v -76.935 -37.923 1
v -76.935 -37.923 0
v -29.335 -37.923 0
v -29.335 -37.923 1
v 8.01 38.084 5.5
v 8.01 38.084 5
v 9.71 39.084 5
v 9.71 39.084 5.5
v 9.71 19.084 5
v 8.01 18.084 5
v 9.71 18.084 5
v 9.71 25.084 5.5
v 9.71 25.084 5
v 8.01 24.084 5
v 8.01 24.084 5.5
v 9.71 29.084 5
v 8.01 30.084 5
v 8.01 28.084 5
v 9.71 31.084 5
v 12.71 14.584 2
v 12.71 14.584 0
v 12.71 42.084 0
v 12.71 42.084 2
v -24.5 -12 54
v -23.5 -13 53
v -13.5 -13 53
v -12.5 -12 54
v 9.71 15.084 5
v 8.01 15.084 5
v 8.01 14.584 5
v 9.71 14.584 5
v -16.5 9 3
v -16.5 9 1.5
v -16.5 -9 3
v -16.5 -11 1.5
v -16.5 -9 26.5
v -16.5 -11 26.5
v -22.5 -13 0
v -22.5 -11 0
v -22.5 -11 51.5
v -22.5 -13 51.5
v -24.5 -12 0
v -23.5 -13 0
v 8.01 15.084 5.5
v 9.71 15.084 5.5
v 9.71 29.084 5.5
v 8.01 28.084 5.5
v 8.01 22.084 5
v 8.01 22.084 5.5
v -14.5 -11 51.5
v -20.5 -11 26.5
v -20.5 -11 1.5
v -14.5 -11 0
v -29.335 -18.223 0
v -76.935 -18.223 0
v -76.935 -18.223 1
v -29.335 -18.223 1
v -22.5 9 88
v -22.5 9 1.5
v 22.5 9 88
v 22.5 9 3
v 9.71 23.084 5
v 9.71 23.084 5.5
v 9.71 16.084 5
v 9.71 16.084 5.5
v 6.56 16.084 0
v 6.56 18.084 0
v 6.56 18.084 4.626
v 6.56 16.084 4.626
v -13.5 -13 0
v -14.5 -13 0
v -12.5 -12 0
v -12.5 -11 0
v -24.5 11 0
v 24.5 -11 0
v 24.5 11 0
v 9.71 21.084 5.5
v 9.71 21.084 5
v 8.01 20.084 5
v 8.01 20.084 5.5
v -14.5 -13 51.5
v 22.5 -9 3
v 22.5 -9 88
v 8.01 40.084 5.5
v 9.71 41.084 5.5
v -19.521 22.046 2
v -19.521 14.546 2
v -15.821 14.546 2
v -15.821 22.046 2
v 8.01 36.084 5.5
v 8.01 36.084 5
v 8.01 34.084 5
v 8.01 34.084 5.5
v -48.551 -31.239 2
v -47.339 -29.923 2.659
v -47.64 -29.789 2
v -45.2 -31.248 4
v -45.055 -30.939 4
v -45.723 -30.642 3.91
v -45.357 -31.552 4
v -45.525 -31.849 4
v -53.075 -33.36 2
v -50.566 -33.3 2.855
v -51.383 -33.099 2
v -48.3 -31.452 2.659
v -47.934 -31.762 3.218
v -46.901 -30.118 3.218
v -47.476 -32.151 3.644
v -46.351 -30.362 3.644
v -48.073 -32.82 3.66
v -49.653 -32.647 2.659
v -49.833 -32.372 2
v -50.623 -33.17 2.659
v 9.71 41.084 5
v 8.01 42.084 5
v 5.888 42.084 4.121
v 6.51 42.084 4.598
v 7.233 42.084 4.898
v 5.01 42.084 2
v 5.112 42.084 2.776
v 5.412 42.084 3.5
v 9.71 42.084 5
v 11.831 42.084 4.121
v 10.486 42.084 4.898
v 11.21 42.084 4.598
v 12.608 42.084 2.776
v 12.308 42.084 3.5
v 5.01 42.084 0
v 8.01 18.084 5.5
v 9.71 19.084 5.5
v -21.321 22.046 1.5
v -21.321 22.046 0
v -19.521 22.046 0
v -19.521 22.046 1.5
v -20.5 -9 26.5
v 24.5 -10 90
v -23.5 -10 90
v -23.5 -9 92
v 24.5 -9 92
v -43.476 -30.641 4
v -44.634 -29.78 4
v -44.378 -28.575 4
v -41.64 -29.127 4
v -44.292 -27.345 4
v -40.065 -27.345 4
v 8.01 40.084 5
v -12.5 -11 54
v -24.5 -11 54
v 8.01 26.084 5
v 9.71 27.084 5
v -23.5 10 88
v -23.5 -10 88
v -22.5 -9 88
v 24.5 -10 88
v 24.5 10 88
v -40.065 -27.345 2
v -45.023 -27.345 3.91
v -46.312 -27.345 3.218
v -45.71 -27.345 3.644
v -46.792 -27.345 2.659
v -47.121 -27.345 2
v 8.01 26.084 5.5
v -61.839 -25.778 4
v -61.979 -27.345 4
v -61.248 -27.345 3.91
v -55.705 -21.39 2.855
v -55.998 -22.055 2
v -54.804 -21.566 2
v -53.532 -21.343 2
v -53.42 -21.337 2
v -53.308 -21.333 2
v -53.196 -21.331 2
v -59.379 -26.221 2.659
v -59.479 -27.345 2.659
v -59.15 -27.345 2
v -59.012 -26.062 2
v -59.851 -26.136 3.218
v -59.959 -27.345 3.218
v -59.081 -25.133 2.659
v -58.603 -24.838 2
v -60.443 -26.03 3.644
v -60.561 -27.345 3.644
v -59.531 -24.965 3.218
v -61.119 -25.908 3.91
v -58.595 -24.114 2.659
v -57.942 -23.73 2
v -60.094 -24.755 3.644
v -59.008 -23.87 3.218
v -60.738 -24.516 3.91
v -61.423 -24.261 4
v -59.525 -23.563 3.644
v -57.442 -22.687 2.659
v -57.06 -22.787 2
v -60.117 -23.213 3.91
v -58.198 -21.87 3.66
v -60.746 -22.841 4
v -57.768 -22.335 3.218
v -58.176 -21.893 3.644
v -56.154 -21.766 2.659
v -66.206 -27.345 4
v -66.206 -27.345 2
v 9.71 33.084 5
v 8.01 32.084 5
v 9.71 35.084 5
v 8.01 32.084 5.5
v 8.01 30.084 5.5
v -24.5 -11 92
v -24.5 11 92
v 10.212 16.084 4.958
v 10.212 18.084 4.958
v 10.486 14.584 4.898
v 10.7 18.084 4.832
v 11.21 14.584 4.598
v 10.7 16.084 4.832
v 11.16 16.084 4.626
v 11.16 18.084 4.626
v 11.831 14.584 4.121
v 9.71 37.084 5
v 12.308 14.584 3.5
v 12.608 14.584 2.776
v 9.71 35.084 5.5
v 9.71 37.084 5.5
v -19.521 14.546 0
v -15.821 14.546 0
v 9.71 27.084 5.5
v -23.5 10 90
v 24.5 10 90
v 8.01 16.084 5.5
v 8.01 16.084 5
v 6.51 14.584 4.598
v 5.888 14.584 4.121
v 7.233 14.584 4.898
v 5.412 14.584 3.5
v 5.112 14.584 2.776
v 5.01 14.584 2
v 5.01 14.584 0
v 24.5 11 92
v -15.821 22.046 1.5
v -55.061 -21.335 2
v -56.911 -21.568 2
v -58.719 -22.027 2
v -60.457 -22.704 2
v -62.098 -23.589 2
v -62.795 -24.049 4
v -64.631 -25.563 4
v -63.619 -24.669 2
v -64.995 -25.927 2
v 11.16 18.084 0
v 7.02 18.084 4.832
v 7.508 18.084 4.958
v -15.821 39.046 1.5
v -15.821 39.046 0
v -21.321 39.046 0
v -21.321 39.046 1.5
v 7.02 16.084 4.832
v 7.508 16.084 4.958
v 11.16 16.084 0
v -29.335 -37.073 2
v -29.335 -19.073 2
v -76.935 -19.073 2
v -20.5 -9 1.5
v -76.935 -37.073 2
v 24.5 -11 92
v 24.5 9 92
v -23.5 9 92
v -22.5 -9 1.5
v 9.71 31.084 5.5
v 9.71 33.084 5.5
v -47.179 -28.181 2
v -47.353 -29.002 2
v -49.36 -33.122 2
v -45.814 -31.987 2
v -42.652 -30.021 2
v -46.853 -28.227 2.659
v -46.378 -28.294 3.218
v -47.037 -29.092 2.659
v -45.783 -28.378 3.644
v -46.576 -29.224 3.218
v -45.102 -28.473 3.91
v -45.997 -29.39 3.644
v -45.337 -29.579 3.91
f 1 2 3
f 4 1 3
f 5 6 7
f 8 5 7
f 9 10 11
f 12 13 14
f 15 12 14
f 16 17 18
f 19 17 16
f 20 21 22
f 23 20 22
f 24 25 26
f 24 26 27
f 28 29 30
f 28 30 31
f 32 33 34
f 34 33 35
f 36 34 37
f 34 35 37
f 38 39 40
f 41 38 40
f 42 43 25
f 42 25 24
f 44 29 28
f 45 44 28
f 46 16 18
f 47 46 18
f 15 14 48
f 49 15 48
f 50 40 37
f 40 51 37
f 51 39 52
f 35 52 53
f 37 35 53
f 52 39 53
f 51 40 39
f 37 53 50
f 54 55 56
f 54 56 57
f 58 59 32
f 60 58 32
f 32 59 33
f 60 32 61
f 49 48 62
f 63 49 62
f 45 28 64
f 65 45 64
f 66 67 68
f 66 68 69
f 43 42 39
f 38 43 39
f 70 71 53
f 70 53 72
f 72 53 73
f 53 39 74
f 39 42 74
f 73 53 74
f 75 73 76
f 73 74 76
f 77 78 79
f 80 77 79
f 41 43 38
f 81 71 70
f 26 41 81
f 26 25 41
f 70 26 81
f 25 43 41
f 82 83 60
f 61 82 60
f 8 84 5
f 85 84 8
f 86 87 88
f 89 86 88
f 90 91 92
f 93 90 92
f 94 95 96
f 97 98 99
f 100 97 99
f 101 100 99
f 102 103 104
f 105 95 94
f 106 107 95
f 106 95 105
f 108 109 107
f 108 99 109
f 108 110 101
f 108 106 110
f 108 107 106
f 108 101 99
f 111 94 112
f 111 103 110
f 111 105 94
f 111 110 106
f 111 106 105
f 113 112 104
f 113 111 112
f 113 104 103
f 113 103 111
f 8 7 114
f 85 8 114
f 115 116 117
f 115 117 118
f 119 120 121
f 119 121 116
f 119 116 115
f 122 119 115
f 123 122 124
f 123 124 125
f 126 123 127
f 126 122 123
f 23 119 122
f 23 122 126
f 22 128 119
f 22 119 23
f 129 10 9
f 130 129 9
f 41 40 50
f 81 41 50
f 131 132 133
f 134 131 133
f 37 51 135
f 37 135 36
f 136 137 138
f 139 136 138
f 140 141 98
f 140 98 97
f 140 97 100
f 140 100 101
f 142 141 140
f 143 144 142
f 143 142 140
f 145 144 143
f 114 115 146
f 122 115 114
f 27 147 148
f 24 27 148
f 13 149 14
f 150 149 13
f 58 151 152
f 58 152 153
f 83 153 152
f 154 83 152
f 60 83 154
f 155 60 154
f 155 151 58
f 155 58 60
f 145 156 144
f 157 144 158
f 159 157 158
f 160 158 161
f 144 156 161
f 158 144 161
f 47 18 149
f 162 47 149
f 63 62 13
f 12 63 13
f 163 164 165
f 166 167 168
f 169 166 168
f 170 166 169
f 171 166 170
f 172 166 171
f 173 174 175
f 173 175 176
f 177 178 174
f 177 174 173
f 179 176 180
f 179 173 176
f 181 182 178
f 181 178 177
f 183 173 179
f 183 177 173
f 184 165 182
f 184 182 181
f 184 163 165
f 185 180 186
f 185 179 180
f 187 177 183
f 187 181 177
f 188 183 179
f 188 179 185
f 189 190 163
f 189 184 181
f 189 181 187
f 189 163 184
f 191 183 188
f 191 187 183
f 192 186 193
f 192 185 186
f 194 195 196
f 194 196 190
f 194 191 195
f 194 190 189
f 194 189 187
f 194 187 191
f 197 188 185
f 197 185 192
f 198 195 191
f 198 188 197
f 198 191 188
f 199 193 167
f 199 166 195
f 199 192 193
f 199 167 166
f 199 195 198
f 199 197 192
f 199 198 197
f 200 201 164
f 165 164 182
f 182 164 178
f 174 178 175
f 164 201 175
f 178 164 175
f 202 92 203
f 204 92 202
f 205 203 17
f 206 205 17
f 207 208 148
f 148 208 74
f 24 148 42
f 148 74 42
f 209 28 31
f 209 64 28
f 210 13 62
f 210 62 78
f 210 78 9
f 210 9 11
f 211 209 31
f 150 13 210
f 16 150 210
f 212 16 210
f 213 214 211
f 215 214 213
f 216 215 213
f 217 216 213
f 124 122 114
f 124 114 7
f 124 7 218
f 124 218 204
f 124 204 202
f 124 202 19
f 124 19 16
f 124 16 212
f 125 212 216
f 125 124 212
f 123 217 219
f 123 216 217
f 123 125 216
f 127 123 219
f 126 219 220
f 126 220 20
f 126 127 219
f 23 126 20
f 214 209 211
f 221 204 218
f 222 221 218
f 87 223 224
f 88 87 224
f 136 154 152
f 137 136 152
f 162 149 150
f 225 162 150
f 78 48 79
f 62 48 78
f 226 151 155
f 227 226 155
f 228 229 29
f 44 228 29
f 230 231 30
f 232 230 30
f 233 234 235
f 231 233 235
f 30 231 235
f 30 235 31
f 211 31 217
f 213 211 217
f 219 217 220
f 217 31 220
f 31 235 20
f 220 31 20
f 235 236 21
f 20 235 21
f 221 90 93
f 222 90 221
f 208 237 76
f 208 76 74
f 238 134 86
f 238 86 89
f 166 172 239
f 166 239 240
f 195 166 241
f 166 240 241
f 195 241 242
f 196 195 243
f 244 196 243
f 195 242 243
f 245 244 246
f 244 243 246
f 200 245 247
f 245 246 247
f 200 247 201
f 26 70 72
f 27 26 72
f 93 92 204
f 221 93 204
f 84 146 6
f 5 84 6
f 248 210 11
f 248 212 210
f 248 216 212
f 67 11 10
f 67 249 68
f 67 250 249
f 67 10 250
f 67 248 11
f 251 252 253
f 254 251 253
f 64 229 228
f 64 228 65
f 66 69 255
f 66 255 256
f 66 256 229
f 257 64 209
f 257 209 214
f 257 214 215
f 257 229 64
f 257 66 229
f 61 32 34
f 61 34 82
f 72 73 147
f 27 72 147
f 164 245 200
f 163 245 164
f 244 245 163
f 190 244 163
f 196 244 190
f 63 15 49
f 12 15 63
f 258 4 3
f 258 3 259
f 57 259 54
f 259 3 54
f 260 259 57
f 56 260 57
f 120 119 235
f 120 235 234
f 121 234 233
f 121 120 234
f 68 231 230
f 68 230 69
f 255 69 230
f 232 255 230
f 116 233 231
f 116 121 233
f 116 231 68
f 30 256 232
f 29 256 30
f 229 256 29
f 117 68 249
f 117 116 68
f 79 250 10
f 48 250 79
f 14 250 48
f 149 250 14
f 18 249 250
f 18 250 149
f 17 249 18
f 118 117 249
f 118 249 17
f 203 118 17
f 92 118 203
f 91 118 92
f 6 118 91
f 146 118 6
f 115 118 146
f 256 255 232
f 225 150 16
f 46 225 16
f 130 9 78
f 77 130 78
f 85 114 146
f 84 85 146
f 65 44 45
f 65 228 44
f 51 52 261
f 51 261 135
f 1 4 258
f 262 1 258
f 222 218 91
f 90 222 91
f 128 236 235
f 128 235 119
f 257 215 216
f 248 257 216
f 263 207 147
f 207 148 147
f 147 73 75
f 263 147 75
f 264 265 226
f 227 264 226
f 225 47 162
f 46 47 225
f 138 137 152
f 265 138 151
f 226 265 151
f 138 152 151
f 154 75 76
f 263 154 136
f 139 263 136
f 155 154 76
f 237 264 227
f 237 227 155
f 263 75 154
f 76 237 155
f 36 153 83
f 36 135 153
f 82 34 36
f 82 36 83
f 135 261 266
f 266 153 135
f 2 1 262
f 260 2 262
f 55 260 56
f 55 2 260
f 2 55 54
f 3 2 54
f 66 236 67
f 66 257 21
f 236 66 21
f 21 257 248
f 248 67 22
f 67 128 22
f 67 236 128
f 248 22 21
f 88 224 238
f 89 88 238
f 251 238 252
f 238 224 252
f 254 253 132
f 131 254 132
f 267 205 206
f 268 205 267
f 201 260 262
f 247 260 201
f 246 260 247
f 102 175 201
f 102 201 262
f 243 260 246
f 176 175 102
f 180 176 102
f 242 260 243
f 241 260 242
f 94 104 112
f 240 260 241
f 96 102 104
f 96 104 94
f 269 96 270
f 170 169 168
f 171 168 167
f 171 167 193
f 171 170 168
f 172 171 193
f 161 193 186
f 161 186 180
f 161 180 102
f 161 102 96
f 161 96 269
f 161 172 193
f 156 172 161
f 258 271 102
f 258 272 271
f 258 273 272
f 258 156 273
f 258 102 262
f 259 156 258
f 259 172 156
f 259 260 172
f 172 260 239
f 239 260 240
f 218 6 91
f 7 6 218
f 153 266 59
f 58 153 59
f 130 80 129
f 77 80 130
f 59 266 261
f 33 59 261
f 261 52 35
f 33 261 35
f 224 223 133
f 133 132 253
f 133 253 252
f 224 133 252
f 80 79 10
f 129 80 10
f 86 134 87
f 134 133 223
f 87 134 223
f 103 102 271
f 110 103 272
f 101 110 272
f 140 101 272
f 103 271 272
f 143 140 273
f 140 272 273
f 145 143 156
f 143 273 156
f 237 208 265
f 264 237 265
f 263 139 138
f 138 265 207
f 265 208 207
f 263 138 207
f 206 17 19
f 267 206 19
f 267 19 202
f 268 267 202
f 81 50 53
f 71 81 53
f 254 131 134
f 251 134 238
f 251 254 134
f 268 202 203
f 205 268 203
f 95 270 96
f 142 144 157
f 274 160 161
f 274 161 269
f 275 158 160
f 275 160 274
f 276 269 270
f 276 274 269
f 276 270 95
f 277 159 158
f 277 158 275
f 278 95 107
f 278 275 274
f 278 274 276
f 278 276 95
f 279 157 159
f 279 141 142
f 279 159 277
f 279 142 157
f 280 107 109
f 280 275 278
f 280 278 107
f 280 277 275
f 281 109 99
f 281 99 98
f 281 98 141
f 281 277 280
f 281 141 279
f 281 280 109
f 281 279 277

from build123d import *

# Parameters (mm, degrees)
F0_W         = 49
F0_H         = 22
F0_W_2       = 45
F0_H_2       = 18
F1_DEPTH     = 88
F2_DEPTH     = 3
F3_W         = 4
F3_H         = 25
F4_DEPTH     = 20
F5_DEPTH     = 1.5
F6_W         = 2
F6_H         = 50
F6_H_2       = 1.5
F7_DEPTH     = 2
F8_T1_DEPTH  = 17.1433659759
F8_T3_DEPTH  = 59.1433659759
F10_DEPTH    = 1.5
F9_W         = 3.7
F9_H         = 6
F9_H_2       = 1.5
F11_DEPTH    = 2
F9_W_2       = 7.7
F9_H_3       = 27.5
F12_DEPTH    = 5
F13_DEPTH    = 2.5
F14_R        = 3
F16_DEPTH    = 0.5
F18_DEPTH    = 32.1
F19_DEPTH    = 4
F21_DEPTH    = 48
F22_W        = 47.6
F22_H        = 19.7
F23_DEPTH    = 2
F25_DEPTH    = 49
F27_DEPTH    = 2
F28_T2_ANGLE = 271.3601385913
F28_T4_ANGLE = 271.3601385913


# Not quite as in the source:
# - a fillet or chamfer that OpenCascade refuses, or shapes differently, is made with other operations: its cross-section is extruded or revolved along the edge and cut away or added


with BuildPart() as f1:
    # F0 (on Top) → F1 (new body)
    with BuildSketch(Plane.XY):
        Rectangle(F0_W, F0_H)
        Rectangle(F0_W_2, F0_H_2, mode=Mode.SUBTRACT)
    extrude(amount=F1_DEPTH)

    # F0 (on Top) → F2 (join)
    with BuildSketch(Plane.XY):
        Rectangle(F0_W_2, F0_H_2)
    extrude(amount=F2_DEPTH)

    # F3 (on face) → F4 (cut)
    with BuildSketch(Plane.XZ.offset(11)):
        with Locations((-18.5, 14)):
            Rectangle(F3_W, F3_H)
    extrude(amount=-F4_DEPTH, mode=Mode.SUBTRACT)

    # F5 (cut): a face of the model
    f5_faces = [f1.faces().sort_by_distance(p)[0] for p in [
        (-21.5, 0, 3),
    ]]
    extrude(f5_faces, amount=-F5_DEPTH, mode=Mode.SUBTRACT)

    # F6 (on face) → F7 (join)
    with BuildSketch(Plane.XZ.offset(11)):
        with Locations((-23.5, 26.5)):
            Rectangle(F6_W, F6_H)
        Polygon((-24.5, 51.5), (-22.5, 51.5), (-14.5, 51.5), (-12.5, 51.5), (-12.5, 54), (-24.5, 54), align=None)
        with Locations((-13.5, 26.5)):
            Rectangle(F6_W, F6_H)
        with Locations((-23.5, 0.75)):
            Rectangle(F6_W, F6_H_2)
        with Locations((-13.5, 0.75)):
            Rectangle(F6_W, F6_H_2)
    extrude(amount=F7_DEPTH)

    # F8: chamfer of 1 on 5 edges, made by hand

    # F8_s2 → F8_t1 (cut)
    with BuildSketch(Plane.YZ.offset(-27.071682988)):
        Polygon((-13, 53), (-12, 54), (-13, 54), align=None)
    extrude(amount=F8_T1_DEPTH, mode=Mode.SUBTRACT)

    # F8_s4 → F8_t3 (cut)
    with BuildSketch(Plane.XY.offset(-2.571682988)):
        Polygon((-23.5, -13), (-24.5, -12), (-24.5, -13), align=None)
        Polygon((-13.5, -13), (-12.5, -12), (-12.5, -13), align=None)
    extrude(amount=F8_T3_DEPTH, mode=Mode.SUBTRACT)

    # F17 (on face) → F19 (join)
    with BuildSketch(Plane.XY.offset(88)):
        Polygon((-23.5, 10), (-22.5, 10), (22.5, 10), (24.5, 10), (24.5, 11), (-24.5, 11), (-24.5, -11), (24.5, -11), (24.5, -10), (22.5, -10), (-22.5, -10), (-23.5, -10), align=None)
    extrude(amount=F19_DEPTH)

    # F20 (on face) → F21 (join)
    with BuildSketch(Plane.YZ.offset(-23.5)):
        Polygon((-9, 92), (-10, 92), (-10, 90), align=None)
        Polygon((10, 92), (9, 92), (10, 90), align=None)
    extrude(amount=F21_DEPTH)


with BuildPart() as f10:
    # F9 (on Top) → F10 (new body)
    with BuildSketch(Plane.XY):
        Polygon((-15.8205656037, 22.0463685691), (-15.8205656037, 39.0463685691), (-21.3205656037, 39.0463685691), (-21.3205656037, 22.0463685691), (-19.5205656037, 22.0463685691), align=None)
    extrude(amount=F10_DEPTH)

    # F9 (on Top) → F11 (join)
    with BuildSketch(Plane.XY):
        with Locations((-17.6705656037, 17.5463685691)):
            Rectangle(F9_W, F9_H)
        with Locations((-17.6705656037, 21.2963685691)):
            Rectangle(F9_W, F9_H_2)
    extrude(amount=F11_DEPTH)


with BuildPart() as f12:
    # F9 (on Top) → F12 (new body)
    with BuildSketch(Plane.XY):
        with Locations((8.8597331405, 28.3340272307)):
            Rectangle(F9_W_2, F9_H_3)
        Polygon((11.1597331405, 16.0840272307), (8.8597331405, 16.0840272307), (6.5597331405, 16.0840272307), (6.5597331405, 18.0840272307), (11.1597331405, 18.0840272307), align=None, mode=Mode.SUBTRACT)
        Polygon((6.5597331405, 16.0840272307), (8.8597331405, 16.0840272307), (11.1597331405, 16.0840272307), (11.1597331405, 18.0840272307), (6.5597331405, 18.0840272307), align=None)
    extrude(amount=F12_DEPTH)

    # F9 (on Top) → F13 (cut)
    with BuildSketch(Plane.XY):
        Polygon((6.5597331405, 16.0840272307), (8.8597331405, 16.0840272307), (11.1597331405, 16.0840272307), (11.1597331405, 18.0840272307), (6.5597331405, 18.0840272307), align=None)
    extrude(amount=F13_DEPTH, mode=Mode.SUBTRACT)

    # F14
    f14_edges = [f12.edges().sort_by_distance(p)[0] for p in [
        (5.009733, 28.334027, 5),
        (12.709733, 28.334027, 5),
    ]]
    fillet(f14_edges, radius=F14_R)

    # F15 (on face) → F16 (join)
    with BuildSketch(Plane.XY.offset(5)):
        Polygon((9.7097331405, 39.0840272307), (9.7097331405, 41.0840272307), (8.0097331405, 40.0840272307), align=None)
        Polygon((9.7097331405, 39.0840272307), (8.0097331405, 40.0840272307), (8.0097331405, 39.0840272307), (8.0097331405, 38.0840272307), align=None)
        Polygon((9.7097331405, 35.0840272307), (9.7097331405, 37.0840272307), (8.0097331405, 36.0840272307), align=None)
        Polygon((9.7097331405, 35.0840272307), (8.0097331405, 36.0840272307), (8.0097331405, 35.0840272307), (8.0097331405, 34.0840272307), align=None)
        Polygon((9.7097331405, 31.0840272307), (9.7097331405, 33.0840272307), (8.0097331405, 32.0840272307), align=None)
        Polygon((9.7097331405, 31.0840272307), (8.0097331405, 32.0840272307), (8.0097331405, 31.0840272307), (8.0097331405, 30.0840272307), align=None)
        Polygon((9.7097331405, 27.0840272307), (9.7097331405, 29.0840272307), (8.0097331405, 28.0840272307), align=None)
        Polygon((9.7097331405, 27.0840272307), (8.0097331405, 28.0840272307), (8.0097331405, 27.0840272307), (8.0097331405, 26.0840272307), align=None)
        Polygon((9.7097331405, 23.0840272307), (9.7097331405, 25.0840272307), (8.0097331405, 24.0840272307), align=None)
        Polygon((9.7097331405, 23.0840272307), (8.0097331405, 24.0840272307), (8.0097331405, 23.0840272307), (8.0097331405, 22.0840272307), align=None)
        Polygon((9.7097331405, 19.0840272307), (9.7097331405, 21.0840272307), (8.0097331405, 20.0840272307), align=None)
        Polygon((9.7097331405, 19.0840272307), (8.0097331405, 20.0840272307), (8.0097331405, 19.0840272307), (8.0097331405, 18.0840272307), align=None)
        Polygon((9.7097331405, 15.0840272307), (9.7097331405, 17.0840272307), (8.0097331405, 16.0840272307), align=None)
        Polygon((9.7097331405, 15.0840272307), (8.0097331405, 16.0840272307), (8.0097331405, 15.0840272307), align=None)
    extrude(amount=F16_DEPTH)

    # F9 (on Top) → F18 (cut)
    with BuildSketch(Plane.XY):
        Polygon((6.5597331405, 16.0840272307), (8.8597331405, 16.0840272307), (11.1597331405, 16.0840272307), (11.1597331405, 18.0840272307), (6.5597331405, 18.0840272307), align=None)
    extrude(amount=F18_DEPTH, mode=Mode.SUBTRACT)


with BuildPart() as f23:
    # F22 (on Top) → F23 (new body)
    with BuildSketch(Plane.XY):
        with Locations((-53.1354887307, -28.0733844578)):
            Rectangle(F22_W, F22_H)
    extrude(amount=F23_DEPTH)

    # F24 (on face) → F25 (cut)
    with BuildSketch(Plane.YZ.offset(-29.3354887307)):
        Polygon((-37.9233844578, 1), (-37.0733844578, 2), (-37.9233844578, 2), align=None)
        Polygon((-18.2233844578, 2), (-19.0733844578, 2), (-18.2233844578, 1), align=None)
    extrude(amount=-F25_DEPTH, mode=Mode.SUBTRACT)

    # F26 (on face) → F27 (join)
    with BuildSketch(Plane.XY.offset(2)):
        with BuildLine():
            ThreePointArc((-53.195998495, -21.3306639587), (-60.4566809918, -22.7037450747), (-66.2064477801, -27.34519355))
            Line((-66.2064477801, -27.34519355), (-59.1503226965, -27.34519355))
            ThreePointArc((-59.1503226965, -27.34519355), (-57.5267238276, -23.2348064685), (-53.532451262, -21.3434730979))
            ThreePointArc((-53.532451262, -21.3434730979), (-53.3643145243, -21.334713836), (-53.195998495, -21.3306639587))
        make_face()
        with BuildLine():
            ThreePointArc((-47.1206547649, -27.34519355), (-48.8610189494, -31.5768759253), (-53.0749789663, -33.3597231413))
            ThreePointArc((-53.0749789663, -33.3597231413), (-45.8142964696, -31.9866420253), (-40.0645296812, -27.34519355))
            Line((-40.0645296812, -27.34519355), (-47.1206547649, -27.34519355))
        make_face()
    extrude(amount=F27_DEPTH)

    # F28: fillet of radius 3 on 2 edges, made by hand

    # F28_s1 → F28_t2 (revolve, cut)
    with BuildSketch(Plane(origin=(-35.5706079716, 14.8183384522, 0), x_dir=(0, 0, 1), z_dir=(0.9231022415, -0.3845546146, 0))):
        with BuildLine():
            ThreePointArc((2, 51.6907408203), (3.4494897428, 52.7871171375), (4, 54.519167945))
            Line((4, 54.519167945), (4, 51.6907408203))
            Line((4, 51.6907408203), (2, 51.6907408203))
        make_face()
    revolve(axis=Axis((-53.1354887307, -27.34519355, 4), (0, 0, -1)), revolution_arc=F28_T2_ANGLE, mode=Mode.SUBTRACT)

    # F28_s3 → F28_t4 (revolve, cut)
    with BuildSketch(Plane(origin=(-35.5706079716, 14.8183384522, 0), x_dir=(0, 0, 1), z_dir=(-0.9231022415, 0.3845546146, 0))):
        with BuildLine():
            ThreePointArc((2, -39.6610728887), (3.4494897428, -38.5646965715), (4, -36.8326457639))
            Line((4, -36.8326457639), (4, -39.6610728887))
            Line((4, -39.6610728887), (2, -39.6610728887))
        make_face()
    revolve(axis=Axis((-53.1354887307, -27.34519355, 4), (0, 0, -1)), revolution_arc=F28_T4_ANGLE, mode=Mode.SUBTRACT)


solid = Compound([f1.part, f10.part, f12.part, f23.part])
